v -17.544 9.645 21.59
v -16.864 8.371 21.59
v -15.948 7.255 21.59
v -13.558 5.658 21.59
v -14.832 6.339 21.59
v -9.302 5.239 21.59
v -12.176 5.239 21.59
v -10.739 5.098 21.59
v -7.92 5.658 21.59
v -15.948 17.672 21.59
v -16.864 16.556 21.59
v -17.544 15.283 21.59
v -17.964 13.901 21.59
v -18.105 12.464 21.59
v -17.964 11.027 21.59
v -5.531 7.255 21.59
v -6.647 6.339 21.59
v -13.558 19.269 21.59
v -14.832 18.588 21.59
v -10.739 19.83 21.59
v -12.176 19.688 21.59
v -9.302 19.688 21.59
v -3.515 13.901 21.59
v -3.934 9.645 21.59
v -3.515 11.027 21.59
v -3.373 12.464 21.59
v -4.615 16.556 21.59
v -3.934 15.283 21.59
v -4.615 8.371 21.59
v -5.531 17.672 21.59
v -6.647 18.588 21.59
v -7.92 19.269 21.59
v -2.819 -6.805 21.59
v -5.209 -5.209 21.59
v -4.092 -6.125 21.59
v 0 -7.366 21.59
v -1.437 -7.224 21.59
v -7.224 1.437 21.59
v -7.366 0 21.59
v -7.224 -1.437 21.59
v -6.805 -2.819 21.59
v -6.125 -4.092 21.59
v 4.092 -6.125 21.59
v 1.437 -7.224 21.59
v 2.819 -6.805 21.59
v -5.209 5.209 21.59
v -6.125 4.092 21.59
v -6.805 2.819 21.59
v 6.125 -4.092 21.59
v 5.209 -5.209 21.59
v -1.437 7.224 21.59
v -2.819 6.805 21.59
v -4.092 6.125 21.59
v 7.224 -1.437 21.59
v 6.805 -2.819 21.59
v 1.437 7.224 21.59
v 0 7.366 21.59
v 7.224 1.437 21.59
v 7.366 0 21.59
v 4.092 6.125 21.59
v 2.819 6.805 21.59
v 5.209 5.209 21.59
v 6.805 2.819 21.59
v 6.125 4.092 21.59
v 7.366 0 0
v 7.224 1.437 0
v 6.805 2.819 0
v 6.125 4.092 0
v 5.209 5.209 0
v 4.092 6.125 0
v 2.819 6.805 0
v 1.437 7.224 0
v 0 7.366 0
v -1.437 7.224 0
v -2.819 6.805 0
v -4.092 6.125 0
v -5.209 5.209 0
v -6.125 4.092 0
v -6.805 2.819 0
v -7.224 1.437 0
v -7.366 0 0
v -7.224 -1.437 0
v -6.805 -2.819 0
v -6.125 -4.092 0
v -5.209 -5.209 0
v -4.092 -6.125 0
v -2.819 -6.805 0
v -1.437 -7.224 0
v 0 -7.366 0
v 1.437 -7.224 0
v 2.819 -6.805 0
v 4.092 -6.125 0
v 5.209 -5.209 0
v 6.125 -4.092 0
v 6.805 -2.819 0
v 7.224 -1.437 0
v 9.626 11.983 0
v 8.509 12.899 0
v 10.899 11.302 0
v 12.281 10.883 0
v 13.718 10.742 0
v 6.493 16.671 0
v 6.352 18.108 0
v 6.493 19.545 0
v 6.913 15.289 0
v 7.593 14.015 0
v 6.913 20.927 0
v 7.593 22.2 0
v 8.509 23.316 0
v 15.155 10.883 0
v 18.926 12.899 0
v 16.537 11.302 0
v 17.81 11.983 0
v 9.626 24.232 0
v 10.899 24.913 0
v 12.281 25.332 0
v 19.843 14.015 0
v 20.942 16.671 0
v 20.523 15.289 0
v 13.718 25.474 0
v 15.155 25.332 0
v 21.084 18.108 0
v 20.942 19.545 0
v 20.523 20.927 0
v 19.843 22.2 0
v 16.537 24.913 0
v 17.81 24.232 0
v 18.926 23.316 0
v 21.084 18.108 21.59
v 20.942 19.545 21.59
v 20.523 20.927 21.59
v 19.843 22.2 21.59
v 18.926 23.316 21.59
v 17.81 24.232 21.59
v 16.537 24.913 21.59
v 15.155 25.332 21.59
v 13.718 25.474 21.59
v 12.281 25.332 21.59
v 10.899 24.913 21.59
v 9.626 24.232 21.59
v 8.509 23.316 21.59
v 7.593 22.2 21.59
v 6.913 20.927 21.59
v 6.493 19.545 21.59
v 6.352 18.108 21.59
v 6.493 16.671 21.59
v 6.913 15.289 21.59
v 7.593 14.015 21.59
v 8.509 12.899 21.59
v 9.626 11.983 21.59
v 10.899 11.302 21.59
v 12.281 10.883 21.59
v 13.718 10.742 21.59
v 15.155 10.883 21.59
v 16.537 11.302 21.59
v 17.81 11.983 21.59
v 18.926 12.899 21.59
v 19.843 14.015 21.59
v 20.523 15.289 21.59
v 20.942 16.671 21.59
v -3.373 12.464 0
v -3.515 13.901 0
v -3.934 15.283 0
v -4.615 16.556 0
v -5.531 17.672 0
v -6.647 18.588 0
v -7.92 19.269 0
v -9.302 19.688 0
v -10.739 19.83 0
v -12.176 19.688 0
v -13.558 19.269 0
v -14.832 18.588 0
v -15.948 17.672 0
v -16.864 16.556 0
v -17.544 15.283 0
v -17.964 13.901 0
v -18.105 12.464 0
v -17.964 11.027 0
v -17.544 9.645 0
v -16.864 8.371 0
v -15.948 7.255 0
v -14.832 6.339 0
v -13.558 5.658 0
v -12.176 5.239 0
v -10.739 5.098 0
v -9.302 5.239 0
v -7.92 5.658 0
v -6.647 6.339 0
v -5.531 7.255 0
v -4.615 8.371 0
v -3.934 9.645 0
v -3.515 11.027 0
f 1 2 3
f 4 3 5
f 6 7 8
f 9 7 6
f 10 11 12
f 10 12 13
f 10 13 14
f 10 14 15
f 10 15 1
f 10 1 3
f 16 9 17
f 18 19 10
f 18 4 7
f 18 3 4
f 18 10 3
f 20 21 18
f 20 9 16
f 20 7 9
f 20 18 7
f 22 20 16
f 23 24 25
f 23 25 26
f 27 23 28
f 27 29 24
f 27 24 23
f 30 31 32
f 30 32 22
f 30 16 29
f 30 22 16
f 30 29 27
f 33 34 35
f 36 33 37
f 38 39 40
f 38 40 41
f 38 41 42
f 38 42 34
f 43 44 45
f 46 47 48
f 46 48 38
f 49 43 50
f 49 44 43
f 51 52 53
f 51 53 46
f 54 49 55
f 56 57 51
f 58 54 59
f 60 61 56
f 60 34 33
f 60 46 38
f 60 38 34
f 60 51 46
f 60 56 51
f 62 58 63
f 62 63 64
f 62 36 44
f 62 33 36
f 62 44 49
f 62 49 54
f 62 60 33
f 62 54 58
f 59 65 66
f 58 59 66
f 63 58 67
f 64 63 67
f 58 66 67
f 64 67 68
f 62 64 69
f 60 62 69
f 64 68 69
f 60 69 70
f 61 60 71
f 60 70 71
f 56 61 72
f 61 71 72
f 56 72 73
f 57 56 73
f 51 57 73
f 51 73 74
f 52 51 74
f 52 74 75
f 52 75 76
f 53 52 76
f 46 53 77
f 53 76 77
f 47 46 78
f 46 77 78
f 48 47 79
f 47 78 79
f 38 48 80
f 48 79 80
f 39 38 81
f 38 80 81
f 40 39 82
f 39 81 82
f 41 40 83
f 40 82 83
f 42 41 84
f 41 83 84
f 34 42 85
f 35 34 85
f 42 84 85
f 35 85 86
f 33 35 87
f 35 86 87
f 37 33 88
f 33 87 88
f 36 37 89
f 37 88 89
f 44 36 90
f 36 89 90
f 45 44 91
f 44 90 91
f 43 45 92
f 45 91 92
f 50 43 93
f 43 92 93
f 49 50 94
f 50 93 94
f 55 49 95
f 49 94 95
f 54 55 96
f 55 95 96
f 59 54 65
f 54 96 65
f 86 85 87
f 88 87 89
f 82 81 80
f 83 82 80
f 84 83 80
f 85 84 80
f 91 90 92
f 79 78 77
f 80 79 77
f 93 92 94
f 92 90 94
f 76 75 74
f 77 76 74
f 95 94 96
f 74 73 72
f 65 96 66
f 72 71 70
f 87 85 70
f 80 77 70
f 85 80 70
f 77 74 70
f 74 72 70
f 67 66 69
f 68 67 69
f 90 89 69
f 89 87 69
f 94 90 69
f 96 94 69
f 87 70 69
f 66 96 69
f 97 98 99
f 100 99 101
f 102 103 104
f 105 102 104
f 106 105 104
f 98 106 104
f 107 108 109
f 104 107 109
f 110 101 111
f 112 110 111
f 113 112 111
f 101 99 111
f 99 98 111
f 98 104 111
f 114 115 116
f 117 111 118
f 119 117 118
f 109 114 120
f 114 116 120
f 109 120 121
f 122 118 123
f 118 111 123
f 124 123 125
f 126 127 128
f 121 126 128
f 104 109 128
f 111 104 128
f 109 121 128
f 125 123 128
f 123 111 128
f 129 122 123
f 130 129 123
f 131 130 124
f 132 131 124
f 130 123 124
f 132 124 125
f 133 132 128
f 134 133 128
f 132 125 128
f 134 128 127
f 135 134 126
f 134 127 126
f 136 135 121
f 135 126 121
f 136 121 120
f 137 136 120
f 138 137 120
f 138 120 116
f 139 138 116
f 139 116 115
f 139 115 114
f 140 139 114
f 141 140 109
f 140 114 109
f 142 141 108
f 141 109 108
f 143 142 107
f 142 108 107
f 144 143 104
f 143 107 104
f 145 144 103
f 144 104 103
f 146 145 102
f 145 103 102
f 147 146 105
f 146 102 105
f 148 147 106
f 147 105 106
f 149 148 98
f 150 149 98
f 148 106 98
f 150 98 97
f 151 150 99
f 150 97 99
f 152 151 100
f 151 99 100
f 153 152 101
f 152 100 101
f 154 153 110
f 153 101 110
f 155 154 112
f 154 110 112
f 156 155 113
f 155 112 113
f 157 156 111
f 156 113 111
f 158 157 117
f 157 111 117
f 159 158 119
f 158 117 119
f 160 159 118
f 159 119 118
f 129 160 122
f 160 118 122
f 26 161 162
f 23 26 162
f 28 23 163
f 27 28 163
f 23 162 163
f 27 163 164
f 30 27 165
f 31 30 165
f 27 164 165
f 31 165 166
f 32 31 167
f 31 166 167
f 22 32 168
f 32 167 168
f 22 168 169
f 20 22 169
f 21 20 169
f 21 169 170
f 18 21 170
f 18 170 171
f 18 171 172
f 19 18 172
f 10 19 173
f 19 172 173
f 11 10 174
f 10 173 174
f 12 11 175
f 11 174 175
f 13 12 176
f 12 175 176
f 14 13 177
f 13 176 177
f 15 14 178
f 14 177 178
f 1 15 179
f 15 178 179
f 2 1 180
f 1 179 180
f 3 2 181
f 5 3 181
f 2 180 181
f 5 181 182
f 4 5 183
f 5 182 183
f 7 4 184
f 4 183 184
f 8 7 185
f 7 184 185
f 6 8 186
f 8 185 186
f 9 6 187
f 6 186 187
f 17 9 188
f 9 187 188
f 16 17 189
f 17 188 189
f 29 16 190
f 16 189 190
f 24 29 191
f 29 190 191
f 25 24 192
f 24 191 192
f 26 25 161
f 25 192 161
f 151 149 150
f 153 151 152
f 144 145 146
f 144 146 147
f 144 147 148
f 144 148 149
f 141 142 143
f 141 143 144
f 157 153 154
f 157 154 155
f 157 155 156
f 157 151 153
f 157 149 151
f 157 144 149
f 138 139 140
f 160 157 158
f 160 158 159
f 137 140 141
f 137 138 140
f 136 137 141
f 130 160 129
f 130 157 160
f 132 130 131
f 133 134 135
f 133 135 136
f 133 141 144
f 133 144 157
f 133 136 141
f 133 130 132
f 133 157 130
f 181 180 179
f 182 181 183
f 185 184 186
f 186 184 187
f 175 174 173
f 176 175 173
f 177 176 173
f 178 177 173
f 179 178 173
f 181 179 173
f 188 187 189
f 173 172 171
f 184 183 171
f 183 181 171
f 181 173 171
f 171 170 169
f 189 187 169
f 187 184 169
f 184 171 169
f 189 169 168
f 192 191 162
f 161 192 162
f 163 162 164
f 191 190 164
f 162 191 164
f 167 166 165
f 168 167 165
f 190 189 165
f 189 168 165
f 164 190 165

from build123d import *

# Parameters (mm, degrees)
F0_R     = 7.366
F1_DEPTH = 21.59


with BuildPart() as f1:
    # F0 (on Top) → F1 (new body)
    with BuildSketch(Plane.XY):
        with Locations((-10.739181, 12.46372)):
            Circle(F0_R)
        Circle(F0_R)
        with Locations((13.71793, 18.107668)):
            Circle(F0_R)
    extrude(amount=F1_DEPTH)


solid = f1.part
